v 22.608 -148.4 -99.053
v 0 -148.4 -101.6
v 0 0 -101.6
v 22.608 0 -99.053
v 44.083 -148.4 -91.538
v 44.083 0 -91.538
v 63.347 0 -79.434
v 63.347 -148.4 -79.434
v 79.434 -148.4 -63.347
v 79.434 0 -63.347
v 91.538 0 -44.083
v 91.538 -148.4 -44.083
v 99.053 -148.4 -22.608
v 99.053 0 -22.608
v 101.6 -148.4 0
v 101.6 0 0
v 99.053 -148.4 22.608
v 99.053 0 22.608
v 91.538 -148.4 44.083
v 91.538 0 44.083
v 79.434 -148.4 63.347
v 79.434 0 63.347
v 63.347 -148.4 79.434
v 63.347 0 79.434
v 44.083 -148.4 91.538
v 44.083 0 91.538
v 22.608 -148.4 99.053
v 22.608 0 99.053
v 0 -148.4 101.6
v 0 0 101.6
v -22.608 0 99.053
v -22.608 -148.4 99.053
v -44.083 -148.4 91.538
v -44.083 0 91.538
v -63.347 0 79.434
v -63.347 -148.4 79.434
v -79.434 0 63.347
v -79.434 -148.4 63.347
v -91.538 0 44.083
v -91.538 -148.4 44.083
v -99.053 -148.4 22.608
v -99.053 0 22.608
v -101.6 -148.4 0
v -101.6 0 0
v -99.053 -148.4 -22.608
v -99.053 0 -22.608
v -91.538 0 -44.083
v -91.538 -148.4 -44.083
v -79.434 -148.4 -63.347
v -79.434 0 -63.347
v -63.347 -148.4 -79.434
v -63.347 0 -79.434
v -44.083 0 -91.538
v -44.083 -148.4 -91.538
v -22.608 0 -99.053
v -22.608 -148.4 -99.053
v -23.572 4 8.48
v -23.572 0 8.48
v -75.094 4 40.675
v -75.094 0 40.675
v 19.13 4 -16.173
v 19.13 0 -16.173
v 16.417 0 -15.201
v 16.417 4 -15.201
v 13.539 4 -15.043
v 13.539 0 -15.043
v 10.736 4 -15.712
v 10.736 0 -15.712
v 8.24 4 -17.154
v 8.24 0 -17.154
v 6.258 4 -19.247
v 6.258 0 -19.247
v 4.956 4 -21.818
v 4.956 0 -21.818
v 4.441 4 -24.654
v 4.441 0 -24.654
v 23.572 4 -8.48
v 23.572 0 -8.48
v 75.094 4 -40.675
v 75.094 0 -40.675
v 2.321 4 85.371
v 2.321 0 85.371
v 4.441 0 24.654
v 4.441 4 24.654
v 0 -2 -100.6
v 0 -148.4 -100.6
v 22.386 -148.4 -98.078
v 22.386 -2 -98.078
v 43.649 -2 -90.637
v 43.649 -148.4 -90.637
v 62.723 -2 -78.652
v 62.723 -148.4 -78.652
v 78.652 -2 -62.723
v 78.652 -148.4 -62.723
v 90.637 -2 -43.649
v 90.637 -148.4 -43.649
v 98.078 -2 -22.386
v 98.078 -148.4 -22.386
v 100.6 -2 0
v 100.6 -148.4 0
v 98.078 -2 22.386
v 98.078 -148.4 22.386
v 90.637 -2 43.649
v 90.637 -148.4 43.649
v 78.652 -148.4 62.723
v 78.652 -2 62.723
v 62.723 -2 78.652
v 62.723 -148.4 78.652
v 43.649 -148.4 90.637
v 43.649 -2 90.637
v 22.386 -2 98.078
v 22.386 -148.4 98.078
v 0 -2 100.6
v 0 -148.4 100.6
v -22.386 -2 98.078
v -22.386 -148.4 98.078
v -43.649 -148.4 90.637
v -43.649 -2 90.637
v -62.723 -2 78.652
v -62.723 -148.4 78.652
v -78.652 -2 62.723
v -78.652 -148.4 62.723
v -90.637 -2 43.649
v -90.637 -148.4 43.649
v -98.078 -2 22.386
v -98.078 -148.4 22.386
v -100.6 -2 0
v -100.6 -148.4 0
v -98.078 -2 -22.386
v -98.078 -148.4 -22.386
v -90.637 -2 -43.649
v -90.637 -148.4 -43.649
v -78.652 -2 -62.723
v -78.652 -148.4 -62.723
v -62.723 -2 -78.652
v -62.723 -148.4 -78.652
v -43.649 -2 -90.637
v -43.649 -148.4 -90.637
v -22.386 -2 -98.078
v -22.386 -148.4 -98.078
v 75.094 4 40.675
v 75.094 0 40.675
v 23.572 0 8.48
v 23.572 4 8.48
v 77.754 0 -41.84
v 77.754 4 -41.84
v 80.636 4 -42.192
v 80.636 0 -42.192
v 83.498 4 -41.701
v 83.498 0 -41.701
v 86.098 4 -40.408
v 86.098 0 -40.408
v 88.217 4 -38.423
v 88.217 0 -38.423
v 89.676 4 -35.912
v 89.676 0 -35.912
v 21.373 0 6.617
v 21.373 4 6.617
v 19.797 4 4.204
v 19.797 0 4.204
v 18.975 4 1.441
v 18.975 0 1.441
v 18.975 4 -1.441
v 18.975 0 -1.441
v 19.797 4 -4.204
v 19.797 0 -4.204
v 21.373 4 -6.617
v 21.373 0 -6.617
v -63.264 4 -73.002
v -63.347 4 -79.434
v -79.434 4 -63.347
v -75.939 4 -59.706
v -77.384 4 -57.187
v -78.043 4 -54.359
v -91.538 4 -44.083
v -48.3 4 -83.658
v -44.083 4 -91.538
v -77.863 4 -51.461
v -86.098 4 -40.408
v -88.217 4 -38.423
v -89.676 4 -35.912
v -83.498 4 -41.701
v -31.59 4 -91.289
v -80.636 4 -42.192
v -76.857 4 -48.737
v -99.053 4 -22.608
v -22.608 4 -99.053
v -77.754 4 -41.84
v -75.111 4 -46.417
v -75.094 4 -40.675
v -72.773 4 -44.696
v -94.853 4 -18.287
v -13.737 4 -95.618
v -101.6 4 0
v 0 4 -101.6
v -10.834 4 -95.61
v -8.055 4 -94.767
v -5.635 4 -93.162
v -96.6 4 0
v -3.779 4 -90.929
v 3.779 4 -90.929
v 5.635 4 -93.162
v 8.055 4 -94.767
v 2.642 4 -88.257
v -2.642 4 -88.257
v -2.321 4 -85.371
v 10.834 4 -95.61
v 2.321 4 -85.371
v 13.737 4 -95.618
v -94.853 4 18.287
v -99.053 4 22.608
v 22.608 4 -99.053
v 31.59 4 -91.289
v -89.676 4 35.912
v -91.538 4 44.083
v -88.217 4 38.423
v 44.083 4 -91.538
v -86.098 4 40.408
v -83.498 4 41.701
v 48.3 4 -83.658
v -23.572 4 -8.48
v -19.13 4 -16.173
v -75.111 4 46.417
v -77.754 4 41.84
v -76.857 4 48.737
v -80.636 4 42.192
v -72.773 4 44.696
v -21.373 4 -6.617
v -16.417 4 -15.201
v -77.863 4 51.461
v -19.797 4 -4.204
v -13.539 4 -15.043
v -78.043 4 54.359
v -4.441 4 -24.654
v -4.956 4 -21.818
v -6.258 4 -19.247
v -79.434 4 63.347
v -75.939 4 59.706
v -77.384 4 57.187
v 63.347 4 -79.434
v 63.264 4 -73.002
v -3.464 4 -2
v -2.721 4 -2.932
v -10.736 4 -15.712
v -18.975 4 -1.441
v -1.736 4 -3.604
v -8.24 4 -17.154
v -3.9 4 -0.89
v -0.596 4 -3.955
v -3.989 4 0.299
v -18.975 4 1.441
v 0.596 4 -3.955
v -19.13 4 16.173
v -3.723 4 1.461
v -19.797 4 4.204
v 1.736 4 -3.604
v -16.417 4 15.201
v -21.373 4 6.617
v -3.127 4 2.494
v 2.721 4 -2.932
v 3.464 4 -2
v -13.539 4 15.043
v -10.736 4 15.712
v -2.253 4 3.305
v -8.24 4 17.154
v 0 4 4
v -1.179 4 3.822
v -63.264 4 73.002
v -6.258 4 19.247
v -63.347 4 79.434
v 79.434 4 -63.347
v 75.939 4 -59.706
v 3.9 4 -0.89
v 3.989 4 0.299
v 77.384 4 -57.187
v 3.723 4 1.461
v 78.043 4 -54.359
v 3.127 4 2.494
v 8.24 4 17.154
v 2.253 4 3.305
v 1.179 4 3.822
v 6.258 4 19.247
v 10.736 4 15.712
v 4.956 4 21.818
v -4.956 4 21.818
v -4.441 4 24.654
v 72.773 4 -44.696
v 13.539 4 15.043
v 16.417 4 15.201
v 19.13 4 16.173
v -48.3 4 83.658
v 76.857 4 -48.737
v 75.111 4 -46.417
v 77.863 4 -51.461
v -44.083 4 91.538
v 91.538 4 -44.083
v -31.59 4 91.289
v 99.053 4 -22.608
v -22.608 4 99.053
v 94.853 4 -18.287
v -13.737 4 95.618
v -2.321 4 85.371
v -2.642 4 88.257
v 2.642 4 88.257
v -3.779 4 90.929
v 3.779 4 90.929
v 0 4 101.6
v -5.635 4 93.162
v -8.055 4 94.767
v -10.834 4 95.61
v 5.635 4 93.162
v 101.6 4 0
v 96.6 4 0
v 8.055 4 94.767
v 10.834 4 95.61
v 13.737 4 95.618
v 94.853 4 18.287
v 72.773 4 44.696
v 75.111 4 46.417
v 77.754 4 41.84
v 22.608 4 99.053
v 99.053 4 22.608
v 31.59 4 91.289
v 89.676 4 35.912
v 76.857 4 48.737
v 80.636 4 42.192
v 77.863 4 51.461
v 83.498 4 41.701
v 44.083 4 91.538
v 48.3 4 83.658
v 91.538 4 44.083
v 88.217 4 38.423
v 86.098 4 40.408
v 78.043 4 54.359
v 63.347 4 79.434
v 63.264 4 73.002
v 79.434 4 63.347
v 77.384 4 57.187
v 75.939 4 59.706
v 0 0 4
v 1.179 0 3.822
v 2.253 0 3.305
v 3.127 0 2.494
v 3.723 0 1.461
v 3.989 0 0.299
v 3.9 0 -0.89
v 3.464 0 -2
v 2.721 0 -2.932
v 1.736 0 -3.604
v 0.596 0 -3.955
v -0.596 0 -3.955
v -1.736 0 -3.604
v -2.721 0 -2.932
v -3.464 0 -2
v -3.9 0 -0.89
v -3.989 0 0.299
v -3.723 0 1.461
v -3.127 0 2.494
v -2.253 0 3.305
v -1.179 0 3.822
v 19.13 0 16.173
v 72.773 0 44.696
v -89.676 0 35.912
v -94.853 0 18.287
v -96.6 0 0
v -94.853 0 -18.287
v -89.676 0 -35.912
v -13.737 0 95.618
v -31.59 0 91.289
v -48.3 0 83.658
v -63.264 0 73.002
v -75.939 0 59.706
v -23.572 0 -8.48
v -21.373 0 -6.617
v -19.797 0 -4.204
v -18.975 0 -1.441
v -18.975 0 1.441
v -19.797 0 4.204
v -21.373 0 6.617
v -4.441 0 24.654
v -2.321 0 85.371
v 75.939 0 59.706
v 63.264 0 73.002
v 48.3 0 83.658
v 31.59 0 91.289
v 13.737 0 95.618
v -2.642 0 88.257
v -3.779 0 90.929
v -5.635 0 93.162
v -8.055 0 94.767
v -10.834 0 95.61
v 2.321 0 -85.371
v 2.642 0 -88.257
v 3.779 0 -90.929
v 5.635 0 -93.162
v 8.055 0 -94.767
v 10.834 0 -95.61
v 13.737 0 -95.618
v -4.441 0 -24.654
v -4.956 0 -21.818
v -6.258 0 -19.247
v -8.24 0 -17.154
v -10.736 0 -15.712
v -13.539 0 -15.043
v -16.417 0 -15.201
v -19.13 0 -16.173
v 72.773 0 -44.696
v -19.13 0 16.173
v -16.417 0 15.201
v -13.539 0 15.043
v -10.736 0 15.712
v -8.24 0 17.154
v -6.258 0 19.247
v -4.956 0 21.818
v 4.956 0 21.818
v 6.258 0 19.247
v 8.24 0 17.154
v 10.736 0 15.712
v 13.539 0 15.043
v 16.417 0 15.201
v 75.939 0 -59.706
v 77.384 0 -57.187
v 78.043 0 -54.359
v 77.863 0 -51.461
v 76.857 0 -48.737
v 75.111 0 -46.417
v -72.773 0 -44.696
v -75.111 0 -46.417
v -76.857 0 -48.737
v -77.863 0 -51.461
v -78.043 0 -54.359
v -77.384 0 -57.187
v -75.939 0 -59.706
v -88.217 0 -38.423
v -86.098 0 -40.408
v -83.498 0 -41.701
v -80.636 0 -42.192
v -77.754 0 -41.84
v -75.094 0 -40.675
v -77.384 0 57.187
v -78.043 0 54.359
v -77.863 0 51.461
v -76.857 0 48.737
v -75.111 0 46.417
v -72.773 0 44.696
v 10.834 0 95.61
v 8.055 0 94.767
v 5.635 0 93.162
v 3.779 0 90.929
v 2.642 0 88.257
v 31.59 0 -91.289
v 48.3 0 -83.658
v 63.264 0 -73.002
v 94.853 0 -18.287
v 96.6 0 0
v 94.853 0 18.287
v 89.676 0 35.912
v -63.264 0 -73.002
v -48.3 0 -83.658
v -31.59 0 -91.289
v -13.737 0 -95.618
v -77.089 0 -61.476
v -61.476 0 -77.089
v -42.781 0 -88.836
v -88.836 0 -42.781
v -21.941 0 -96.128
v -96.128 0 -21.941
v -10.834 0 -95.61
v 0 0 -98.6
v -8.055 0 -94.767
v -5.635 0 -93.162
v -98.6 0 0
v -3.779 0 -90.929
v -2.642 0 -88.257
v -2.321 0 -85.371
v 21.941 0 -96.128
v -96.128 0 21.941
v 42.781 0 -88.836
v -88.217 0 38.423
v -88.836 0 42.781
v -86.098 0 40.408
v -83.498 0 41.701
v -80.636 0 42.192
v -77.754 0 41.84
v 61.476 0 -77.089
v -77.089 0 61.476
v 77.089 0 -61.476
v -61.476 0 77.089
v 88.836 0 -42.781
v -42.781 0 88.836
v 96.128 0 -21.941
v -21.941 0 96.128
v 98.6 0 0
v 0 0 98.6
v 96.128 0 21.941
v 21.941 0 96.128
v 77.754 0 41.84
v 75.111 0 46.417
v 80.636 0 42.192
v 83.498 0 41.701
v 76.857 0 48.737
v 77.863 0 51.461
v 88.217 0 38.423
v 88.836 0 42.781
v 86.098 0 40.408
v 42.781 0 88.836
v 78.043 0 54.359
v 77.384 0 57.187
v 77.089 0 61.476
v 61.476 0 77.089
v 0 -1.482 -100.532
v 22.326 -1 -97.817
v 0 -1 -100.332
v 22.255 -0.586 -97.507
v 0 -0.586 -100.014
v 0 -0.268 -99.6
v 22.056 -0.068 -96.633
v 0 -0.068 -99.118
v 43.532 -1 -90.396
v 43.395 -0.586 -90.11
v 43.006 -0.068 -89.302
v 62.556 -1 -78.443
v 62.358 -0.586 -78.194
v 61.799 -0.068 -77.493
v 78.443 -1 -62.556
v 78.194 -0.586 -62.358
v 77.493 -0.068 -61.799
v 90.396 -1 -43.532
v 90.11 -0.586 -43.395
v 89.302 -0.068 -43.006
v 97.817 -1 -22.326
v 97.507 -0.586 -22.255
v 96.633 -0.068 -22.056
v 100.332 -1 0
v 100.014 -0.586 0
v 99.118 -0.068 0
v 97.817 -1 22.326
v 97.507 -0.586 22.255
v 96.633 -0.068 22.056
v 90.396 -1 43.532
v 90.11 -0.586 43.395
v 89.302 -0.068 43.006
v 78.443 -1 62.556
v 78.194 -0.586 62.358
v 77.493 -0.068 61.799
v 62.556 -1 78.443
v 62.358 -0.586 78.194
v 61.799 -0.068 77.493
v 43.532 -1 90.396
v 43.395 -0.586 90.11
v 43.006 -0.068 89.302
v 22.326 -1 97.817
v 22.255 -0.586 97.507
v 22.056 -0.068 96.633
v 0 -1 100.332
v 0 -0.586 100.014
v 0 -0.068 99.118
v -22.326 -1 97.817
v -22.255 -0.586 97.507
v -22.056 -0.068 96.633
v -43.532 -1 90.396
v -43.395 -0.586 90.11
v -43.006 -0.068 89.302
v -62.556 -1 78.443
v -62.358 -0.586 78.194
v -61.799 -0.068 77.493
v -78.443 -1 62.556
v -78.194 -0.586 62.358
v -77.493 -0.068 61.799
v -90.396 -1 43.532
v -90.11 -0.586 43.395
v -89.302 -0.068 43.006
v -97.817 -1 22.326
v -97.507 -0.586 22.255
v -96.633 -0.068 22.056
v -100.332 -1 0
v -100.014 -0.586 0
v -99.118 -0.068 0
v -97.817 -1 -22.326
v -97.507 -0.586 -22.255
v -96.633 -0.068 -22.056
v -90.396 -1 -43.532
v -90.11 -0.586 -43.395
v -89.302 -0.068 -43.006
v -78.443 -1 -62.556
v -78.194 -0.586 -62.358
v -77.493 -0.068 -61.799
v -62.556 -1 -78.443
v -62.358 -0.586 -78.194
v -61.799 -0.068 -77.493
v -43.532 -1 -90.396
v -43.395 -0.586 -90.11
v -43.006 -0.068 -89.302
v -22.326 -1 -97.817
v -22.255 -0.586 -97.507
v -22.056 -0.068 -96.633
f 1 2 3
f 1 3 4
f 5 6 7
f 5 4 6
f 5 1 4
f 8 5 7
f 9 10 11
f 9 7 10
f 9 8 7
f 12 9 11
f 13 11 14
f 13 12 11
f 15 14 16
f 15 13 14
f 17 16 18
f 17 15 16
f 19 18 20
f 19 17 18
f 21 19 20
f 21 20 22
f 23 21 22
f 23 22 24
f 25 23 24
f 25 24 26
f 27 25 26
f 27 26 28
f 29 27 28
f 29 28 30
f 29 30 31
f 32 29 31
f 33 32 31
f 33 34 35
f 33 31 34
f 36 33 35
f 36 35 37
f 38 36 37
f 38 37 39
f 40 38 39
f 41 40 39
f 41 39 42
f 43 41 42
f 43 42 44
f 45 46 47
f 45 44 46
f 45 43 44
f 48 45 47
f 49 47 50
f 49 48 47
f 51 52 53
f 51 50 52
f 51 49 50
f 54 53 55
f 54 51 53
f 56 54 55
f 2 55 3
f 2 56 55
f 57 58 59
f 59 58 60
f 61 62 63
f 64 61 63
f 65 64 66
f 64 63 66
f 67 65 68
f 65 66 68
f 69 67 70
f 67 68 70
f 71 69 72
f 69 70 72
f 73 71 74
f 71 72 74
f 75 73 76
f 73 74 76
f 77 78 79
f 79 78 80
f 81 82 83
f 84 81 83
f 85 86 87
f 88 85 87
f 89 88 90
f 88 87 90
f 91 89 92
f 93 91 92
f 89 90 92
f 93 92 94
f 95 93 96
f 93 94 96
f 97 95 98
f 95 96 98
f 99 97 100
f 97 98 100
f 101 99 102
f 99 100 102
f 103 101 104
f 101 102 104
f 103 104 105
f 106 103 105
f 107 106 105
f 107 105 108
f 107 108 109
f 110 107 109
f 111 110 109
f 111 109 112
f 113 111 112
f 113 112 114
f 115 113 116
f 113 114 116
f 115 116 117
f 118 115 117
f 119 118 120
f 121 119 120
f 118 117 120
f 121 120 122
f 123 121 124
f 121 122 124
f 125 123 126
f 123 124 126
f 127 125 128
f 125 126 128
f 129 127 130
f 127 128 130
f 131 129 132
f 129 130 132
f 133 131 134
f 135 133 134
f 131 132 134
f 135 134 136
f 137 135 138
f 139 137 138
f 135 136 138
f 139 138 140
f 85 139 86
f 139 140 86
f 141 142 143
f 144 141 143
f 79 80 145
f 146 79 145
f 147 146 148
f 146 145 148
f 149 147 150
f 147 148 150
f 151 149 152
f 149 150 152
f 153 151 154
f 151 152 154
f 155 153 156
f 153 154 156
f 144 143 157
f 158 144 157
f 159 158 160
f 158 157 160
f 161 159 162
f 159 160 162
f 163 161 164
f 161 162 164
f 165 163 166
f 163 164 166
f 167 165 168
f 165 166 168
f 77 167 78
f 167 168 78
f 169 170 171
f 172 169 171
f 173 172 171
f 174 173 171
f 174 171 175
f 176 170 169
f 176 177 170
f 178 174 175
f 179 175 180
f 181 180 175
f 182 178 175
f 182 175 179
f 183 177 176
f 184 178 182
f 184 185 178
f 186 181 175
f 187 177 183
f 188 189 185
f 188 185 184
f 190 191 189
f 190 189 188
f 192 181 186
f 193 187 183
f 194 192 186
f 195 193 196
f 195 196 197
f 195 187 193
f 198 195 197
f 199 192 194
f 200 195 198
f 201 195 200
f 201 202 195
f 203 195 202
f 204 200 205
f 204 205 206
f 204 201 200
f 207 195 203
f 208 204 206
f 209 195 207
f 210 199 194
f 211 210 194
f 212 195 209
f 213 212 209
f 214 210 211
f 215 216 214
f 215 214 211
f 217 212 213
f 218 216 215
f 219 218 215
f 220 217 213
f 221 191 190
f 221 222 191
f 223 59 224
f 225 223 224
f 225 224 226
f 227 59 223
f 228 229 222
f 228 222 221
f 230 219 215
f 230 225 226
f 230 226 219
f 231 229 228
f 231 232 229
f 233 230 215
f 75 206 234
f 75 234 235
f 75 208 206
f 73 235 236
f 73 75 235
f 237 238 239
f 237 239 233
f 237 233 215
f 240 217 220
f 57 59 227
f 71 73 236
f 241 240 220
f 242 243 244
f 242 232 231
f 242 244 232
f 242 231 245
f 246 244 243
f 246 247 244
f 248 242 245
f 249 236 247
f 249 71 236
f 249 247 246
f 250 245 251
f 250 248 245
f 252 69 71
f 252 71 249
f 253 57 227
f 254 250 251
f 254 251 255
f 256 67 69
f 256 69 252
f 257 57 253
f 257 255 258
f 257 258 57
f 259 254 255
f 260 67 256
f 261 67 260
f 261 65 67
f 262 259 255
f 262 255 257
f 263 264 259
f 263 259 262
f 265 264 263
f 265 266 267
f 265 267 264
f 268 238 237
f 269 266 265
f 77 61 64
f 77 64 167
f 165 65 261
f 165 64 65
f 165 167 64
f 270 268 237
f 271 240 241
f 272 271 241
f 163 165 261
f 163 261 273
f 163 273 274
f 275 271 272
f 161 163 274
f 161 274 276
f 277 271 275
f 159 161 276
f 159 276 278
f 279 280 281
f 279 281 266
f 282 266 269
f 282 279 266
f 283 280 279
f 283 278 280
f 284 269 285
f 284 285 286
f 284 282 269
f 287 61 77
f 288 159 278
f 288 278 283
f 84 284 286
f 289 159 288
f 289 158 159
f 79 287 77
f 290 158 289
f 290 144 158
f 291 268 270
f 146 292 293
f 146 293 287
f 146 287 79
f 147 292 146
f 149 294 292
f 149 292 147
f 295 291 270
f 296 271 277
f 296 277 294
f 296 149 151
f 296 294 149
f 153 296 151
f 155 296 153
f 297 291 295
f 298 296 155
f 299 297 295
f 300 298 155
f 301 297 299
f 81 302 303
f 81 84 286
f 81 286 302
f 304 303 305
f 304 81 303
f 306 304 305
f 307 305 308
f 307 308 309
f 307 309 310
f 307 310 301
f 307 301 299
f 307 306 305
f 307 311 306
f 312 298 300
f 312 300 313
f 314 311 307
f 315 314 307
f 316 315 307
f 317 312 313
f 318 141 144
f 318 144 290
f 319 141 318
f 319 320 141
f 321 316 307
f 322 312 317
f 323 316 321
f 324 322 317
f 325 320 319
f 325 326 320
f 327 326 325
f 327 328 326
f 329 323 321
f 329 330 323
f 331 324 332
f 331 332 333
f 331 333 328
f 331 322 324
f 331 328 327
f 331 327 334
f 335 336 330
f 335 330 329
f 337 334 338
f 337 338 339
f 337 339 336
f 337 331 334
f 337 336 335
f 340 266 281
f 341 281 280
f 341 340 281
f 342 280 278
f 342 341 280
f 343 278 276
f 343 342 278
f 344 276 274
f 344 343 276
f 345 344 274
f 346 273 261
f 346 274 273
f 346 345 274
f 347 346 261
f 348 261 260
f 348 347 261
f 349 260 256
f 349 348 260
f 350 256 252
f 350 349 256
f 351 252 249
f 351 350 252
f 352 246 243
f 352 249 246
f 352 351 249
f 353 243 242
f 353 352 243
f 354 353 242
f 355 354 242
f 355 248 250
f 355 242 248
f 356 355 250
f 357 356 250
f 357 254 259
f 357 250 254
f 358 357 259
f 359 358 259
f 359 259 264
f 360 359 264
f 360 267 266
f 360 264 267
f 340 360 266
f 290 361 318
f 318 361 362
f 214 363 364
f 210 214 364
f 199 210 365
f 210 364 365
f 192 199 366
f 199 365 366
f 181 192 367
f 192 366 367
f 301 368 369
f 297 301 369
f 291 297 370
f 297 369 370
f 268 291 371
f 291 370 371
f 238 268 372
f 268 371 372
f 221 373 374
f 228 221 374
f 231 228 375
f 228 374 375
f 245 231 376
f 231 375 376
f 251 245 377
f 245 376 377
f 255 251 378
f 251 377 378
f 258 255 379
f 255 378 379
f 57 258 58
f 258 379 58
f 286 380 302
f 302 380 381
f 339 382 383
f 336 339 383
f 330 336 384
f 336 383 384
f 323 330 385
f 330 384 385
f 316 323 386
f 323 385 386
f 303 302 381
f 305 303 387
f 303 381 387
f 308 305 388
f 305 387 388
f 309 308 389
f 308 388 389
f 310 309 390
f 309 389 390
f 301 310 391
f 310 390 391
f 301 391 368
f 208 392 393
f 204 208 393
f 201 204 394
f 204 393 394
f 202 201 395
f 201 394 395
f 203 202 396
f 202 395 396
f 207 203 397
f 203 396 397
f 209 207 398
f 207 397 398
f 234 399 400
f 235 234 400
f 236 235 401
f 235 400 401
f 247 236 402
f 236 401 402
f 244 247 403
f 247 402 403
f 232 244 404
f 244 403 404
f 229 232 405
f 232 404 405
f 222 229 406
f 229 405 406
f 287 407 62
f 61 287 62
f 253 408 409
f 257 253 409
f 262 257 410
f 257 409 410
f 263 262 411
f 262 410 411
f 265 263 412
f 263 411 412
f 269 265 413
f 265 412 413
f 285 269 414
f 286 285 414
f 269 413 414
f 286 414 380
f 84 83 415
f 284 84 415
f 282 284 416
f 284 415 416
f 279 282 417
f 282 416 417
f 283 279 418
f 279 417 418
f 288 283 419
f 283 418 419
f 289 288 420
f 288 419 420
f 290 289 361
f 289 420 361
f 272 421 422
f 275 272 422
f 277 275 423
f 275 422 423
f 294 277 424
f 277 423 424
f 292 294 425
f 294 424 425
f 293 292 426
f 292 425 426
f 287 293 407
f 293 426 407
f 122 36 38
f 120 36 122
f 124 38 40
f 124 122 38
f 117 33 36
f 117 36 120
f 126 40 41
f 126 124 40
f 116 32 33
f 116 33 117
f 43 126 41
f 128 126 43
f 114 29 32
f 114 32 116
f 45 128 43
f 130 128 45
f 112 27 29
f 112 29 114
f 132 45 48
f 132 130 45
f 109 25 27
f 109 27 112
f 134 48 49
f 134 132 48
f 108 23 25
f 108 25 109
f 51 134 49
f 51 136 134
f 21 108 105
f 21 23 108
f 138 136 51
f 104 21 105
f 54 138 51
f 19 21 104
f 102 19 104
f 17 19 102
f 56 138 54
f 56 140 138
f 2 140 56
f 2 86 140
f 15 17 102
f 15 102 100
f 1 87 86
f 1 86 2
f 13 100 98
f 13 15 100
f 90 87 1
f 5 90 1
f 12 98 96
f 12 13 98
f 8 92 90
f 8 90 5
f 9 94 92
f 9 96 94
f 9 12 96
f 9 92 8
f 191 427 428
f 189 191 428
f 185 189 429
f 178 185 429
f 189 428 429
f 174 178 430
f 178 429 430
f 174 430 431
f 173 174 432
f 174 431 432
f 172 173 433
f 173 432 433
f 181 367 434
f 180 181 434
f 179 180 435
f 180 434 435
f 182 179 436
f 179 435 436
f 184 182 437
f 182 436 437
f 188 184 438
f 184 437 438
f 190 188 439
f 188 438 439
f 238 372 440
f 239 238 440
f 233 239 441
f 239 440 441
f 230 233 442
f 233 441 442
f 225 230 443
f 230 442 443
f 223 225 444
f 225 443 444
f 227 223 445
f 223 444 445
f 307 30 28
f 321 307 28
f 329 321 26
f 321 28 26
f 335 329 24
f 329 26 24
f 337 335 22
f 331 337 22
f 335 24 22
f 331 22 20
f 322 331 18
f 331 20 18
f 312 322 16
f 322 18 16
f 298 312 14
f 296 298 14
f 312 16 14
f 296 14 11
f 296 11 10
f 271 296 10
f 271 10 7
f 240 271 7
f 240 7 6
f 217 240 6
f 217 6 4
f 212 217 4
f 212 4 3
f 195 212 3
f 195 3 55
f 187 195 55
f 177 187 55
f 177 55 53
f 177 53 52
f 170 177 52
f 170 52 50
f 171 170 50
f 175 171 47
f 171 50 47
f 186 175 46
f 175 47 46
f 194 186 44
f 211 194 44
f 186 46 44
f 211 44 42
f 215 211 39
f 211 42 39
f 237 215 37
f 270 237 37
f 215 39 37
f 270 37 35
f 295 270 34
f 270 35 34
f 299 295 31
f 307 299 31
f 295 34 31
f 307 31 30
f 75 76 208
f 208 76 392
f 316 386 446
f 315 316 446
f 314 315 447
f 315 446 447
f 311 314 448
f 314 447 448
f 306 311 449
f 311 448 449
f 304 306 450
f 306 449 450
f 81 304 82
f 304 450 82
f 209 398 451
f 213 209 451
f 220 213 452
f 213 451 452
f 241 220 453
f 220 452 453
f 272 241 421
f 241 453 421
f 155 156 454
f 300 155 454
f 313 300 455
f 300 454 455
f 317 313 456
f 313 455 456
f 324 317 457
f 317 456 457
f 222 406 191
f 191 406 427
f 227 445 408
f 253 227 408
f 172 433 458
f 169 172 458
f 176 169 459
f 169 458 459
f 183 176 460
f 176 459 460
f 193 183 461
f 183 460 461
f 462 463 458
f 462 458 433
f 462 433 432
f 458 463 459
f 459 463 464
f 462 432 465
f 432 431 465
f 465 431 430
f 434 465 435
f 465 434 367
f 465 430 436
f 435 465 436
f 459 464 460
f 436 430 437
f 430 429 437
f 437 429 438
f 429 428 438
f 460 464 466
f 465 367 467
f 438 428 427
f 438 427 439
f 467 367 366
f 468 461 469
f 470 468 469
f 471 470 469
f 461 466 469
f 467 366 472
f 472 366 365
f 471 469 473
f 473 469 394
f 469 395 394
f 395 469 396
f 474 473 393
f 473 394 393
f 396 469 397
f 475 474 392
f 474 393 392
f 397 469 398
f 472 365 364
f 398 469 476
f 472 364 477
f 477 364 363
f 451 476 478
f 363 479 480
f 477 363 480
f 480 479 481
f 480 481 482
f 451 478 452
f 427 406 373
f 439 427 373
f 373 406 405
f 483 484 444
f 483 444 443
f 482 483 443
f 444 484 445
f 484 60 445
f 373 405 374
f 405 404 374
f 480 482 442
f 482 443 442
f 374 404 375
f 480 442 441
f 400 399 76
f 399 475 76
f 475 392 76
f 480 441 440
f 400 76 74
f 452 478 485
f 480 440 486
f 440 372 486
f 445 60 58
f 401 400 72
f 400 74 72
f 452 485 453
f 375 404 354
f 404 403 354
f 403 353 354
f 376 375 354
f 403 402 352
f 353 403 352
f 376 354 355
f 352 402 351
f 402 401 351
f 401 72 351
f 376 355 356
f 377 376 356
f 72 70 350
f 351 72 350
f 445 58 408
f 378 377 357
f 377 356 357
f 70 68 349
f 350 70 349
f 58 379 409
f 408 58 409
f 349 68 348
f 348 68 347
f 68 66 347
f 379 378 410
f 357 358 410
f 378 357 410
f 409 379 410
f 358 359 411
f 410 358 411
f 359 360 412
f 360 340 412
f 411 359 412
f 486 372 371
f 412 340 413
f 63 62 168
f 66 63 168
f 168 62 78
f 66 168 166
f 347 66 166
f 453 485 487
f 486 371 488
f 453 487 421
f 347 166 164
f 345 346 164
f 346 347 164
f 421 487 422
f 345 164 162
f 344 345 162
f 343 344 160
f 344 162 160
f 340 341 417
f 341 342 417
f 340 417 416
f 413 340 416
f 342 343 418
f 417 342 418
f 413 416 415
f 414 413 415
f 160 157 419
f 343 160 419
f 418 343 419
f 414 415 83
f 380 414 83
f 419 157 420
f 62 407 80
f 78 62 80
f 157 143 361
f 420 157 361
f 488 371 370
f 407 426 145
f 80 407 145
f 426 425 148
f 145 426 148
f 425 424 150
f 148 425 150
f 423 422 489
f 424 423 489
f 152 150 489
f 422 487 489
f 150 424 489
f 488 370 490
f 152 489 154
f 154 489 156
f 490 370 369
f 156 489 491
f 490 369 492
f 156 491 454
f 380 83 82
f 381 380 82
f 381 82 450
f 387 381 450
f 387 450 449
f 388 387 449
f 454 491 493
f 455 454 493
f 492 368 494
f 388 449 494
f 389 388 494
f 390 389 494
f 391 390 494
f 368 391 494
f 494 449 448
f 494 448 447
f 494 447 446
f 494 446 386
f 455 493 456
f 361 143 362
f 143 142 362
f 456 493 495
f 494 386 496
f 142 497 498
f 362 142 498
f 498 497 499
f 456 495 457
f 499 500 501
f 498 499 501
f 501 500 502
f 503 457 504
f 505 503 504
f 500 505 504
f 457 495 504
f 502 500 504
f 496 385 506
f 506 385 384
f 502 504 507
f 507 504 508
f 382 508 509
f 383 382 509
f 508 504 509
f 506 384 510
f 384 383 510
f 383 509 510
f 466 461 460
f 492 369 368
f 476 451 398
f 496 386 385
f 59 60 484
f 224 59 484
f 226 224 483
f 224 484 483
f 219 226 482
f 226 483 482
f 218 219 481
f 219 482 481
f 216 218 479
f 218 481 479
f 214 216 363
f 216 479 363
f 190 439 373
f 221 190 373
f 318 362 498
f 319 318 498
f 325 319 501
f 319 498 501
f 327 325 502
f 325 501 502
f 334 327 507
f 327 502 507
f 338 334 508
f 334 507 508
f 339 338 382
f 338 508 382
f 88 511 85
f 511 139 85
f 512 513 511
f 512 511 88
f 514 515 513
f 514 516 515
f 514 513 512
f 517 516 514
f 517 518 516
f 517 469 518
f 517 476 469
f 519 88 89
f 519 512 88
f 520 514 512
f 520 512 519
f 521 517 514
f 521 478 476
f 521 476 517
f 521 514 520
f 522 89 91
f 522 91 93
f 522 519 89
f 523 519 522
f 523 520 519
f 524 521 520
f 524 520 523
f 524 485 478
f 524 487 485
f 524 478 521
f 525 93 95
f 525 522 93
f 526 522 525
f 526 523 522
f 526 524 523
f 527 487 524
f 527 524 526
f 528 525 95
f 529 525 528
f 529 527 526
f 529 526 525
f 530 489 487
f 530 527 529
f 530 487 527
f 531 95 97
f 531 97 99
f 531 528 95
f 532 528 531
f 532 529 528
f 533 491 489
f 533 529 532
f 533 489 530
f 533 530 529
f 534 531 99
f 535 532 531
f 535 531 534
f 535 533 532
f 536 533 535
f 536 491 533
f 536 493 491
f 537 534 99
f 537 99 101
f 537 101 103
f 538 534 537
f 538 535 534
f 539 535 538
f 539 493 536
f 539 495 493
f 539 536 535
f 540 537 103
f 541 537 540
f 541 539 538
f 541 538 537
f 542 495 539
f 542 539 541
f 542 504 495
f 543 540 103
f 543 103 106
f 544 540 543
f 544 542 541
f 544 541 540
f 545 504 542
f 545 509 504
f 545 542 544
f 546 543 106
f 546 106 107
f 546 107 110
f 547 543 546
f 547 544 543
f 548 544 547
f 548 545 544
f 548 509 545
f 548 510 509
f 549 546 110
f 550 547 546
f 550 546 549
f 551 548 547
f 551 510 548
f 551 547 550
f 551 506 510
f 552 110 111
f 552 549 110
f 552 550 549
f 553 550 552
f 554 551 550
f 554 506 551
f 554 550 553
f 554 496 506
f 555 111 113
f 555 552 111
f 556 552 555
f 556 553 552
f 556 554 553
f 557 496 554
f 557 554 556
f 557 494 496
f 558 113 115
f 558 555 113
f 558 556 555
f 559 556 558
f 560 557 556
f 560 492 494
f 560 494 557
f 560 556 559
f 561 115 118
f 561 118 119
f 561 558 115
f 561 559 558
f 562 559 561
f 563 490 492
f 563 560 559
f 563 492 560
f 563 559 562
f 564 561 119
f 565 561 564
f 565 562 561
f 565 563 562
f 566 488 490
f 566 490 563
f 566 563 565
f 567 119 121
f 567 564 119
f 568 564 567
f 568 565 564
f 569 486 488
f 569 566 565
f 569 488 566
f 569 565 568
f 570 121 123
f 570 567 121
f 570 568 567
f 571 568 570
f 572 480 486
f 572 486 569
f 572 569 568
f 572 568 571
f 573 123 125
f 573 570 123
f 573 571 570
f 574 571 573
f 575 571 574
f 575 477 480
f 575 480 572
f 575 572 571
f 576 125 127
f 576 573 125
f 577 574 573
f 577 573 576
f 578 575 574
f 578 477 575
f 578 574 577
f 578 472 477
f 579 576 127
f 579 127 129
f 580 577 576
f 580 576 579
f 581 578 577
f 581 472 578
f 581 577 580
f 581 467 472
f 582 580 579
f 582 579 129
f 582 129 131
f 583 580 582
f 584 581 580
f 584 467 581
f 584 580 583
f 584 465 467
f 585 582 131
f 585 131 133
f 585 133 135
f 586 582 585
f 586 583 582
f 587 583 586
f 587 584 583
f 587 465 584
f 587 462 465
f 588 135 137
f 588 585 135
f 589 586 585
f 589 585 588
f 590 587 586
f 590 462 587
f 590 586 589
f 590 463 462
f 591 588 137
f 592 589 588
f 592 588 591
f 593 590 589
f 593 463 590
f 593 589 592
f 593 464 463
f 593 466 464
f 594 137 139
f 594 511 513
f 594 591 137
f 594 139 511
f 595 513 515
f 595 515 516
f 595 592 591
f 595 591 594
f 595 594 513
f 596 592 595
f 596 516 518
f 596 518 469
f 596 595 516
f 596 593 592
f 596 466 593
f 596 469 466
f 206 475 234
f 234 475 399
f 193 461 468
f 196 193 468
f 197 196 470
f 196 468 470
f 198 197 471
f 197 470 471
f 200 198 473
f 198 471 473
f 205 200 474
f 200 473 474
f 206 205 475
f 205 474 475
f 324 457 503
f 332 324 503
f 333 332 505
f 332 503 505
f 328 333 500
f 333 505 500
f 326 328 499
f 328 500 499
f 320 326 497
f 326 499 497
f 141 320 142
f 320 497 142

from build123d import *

# Parameters (mm, degrees)
SKETCH1_R           = 101.6
BOSS_EXTRUDE1_DEPTH = 4
CUT_EXTRUDE2_DEPTH  = 144.739764853
CIRPATTERN1_COUNT   = 6
SKETCH5_R           = 4
CUT_EXTRUDE3_DEPTH  = 144.739764853
BOSS_EXTRUDE2_START = 148.4
SKETCH6_R           = 101.6
SKETCH6_R_2         = 100.6
BOSS_EXTRUDE2_DEPTH = 148.4
FILLET1_R           = 2


with BuildPart() as part:
    # Sketch1 → Boss-Extrude1 (new body)
    with BuildSketch(Plane(origin=(0, 0, 0), x_dir=(1, 0, 0), z_dir=(0, 1, 0))):
        with Locations(Location((0, 0, 0), (0, 0, 270))):
            Circle(SKETCH1_R)
    extrude(amount=BOSS_EXTRUDE1_DEPTH)

    # Sketch2 → Cut-Extrude2 (cut, through all)
    with BuildSketch(Plane(origin=(0, 0, 0), x_dir=(1, 0, 0), z_dir=(0, 1, 0))):
        with BuildLine():
            Line((23.571606506, 8.480480962), (75.093958746, 40.675219815))
            ThreePointArc((75.093958746, 40.675219815), (83.497889012, 41.700558349), (89.676425221, 35.912376134))
            ThreePointArc((89.676425221, 35.912376134), (96.6, 0), (89.676425221, -35.912376134))
            ThreePointArc((89.676425221, -35.912376134), (83.497889012, -41.700558349), (75.093958746, -40.675219815))
            Line((75.093958746, -40.675219815), (23.571606506, -8.480480962))
            ThreePointArc((23.571606506, -8.480480962), (18.870799148, 0), (23.571606506, 8.480480962))
        make_face()
    cut_extrude2 = extrude(amount=CUT_EXTRUDE2_DEPTH, mode=Mode.SUBTRACT)

    # CirPattern1: Cut-Extrude2 ×6 about axis
    cirpattern1_axis = Axis((0, 0, 0), (0, 1, 0))
    for i in range(1, CIRPATTERN1_COUNT):
        add(cut_extrude2.rotate(cirpattern1_axis, i * 360 / CIRPATTERN1_COUNT), mode=Mode.SUBTRACT)

    # Sketch5 → Cut-Extrude3 (cut, through all)
    with BuildSketch(Plane(origin=(0, 0, 0), x_dir=(1, 0, 0), z_dir=(0, 1, 0))):
        with Locations(Location((0, 0, 0), (0, 0, 270))):
            Circle(SKETCH5_R)
    extrude(amount=CUT_EXTRUDE3_DEPTH, mode=Mode.SUBTRACT)

    # Sketch6 → Boss-Extrude2 (add)
    with BuildSketch(Plane.XZ.offset(BOSS_EXTRUDE2_START)):
        with Locations(Location((0, 0, 0), (0, 0, 270))):
            Circle(SKETCH6_R)
        with Locations(Location((0, 0, 0), (0, 0, 270))):
            Circle(SKETCH6_R_2, mode=Mode.SUBTRACT)
    extrude(amount=-BOSS_EXTRUDE2_DEPTH)

    # Fillet1
    fillet1_edges = [part.edges().sort_by_distance(p)[0] for p in [
        (0, 0, 100.6),
    ]]
    fillet(fillet1_edges, radius=FILLET1_R)


solid = part.part
